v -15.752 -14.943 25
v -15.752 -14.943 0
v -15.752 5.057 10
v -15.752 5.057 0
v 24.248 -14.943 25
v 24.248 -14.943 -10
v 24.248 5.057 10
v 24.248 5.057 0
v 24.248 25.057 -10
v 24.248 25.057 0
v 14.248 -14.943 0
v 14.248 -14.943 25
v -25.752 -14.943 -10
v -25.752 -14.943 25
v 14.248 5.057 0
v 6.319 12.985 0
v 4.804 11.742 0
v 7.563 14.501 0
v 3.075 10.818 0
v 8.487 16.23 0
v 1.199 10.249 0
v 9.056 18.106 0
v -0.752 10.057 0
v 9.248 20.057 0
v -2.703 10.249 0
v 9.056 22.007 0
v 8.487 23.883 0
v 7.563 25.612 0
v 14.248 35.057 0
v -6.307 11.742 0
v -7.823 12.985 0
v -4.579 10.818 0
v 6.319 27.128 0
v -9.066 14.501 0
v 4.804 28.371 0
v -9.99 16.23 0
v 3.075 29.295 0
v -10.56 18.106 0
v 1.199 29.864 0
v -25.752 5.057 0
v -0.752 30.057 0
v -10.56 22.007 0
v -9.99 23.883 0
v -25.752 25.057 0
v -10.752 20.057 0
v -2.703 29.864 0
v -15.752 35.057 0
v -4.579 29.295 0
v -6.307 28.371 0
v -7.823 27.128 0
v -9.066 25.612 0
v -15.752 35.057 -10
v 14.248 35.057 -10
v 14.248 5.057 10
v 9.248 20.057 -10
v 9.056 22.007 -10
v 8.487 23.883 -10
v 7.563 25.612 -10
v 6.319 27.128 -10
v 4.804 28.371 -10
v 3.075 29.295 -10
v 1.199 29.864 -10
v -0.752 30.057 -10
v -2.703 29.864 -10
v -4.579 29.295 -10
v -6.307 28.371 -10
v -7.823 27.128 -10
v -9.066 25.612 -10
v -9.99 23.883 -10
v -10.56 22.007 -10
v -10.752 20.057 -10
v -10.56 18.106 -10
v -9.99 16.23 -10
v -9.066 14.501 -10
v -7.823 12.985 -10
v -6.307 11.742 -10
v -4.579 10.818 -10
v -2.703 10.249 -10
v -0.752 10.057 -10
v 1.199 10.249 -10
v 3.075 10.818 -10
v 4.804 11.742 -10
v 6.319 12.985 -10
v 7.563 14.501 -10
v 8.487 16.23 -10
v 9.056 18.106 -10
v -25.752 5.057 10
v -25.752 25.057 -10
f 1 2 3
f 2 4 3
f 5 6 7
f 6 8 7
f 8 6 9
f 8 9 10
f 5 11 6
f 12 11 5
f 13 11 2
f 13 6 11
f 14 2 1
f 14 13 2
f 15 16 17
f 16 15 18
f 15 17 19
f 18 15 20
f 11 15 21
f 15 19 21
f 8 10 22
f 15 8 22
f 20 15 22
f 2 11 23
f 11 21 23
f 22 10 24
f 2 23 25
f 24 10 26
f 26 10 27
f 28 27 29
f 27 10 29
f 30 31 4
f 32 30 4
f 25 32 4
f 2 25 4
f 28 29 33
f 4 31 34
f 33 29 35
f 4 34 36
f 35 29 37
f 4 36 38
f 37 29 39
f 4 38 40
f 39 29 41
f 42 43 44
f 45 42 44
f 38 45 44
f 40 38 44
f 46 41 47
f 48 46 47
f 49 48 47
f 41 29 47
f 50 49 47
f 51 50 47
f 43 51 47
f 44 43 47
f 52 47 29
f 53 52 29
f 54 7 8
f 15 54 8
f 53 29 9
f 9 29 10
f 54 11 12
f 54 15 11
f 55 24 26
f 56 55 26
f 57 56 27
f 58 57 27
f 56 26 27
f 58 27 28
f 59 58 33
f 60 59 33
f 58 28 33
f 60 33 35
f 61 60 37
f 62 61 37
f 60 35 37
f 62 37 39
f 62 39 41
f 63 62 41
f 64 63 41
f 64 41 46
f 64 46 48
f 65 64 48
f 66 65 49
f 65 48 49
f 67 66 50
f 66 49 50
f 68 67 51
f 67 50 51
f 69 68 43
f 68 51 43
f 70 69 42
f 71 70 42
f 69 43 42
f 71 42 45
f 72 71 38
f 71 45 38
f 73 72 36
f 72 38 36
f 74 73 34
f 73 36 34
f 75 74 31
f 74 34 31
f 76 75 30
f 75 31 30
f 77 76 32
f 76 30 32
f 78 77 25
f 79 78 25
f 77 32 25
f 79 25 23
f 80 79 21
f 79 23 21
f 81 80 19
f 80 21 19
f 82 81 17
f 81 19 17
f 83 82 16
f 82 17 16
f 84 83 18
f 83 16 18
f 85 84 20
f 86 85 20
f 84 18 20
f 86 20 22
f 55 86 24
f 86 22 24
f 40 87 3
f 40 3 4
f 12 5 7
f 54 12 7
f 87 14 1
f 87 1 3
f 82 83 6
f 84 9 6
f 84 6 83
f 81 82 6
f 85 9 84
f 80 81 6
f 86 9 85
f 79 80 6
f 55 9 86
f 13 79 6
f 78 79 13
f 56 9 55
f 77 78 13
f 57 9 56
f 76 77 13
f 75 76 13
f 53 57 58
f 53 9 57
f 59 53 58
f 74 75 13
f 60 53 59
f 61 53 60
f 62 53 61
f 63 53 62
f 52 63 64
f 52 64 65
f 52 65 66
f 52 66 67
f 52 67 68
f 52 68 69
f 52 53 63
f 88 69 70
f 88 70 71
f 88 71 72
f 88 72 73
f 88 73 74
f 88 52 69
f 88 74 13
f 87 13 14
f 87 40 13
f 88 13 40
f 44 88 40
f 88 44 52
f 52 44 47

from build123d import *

# Parameters (mm, degrees)
BOSS_EXTRUDE1_DEPTH = 10
SKETCH2_R           = 10
CUT_EXTRUDE1_DEPTH  = 10
BOSS_EXTRUDE2_DEPTH = 10
BOSS_EXTRUDE3_DEPTH = 10


with BuildPart() as part:
    # Sketch1 → Boss-Extrude1 (new body)
    with BuildSketch(Plane.XY):
        Polygon((-15.751690718, 35.056562454), (14.248309282, 35.056562454), (24.248309282, 25.056562454), (24.248309282, -14.943437546), (-25.751690718, -14.943437546), (-25.751690718, 25.056562454), align=None)
    extrude(amount=-BOSS_EXTRUDE1_DEPTH)

    # Sketch2 → Cut-Extrude1 (cut)
    with BuildSketch(Plane.XY):
        with Locations((-0.751690718, 20.056562454)):
            Circle(SKETCH2_R)
    extrude(amount=-CUT_EXTRUDE1_DEPTH, mode=Mode.SUBTRACT)

    # Sketch3 → Boss-Extrude2 (add)
    with BuildSketch(Plane(origin=(24.248309282, 0, 0), x_dir=(0, 0, -1), z_dir=(1, 0, 0))):
        Polygon((0, -14.943437546), (-25, -14.943437546), (-10, 5.056562454), (0, 5.056562454), align=None)
    extrude(amount=-BOSS_EXTRUDE2_DEPTH)

    # Sketch4 → Boss-Extrude3 (add)
    with BuildSketch(Plane.ZY.offset(25.751690718)):
        Polygon((0, -14.943437546), (25, -14.943437546), (10, 5.056562454), (0, 5.056562454), align=None)
    extrude(amount=-BOSS_EXTRUDE3_DEPTH)


solid = part.part
